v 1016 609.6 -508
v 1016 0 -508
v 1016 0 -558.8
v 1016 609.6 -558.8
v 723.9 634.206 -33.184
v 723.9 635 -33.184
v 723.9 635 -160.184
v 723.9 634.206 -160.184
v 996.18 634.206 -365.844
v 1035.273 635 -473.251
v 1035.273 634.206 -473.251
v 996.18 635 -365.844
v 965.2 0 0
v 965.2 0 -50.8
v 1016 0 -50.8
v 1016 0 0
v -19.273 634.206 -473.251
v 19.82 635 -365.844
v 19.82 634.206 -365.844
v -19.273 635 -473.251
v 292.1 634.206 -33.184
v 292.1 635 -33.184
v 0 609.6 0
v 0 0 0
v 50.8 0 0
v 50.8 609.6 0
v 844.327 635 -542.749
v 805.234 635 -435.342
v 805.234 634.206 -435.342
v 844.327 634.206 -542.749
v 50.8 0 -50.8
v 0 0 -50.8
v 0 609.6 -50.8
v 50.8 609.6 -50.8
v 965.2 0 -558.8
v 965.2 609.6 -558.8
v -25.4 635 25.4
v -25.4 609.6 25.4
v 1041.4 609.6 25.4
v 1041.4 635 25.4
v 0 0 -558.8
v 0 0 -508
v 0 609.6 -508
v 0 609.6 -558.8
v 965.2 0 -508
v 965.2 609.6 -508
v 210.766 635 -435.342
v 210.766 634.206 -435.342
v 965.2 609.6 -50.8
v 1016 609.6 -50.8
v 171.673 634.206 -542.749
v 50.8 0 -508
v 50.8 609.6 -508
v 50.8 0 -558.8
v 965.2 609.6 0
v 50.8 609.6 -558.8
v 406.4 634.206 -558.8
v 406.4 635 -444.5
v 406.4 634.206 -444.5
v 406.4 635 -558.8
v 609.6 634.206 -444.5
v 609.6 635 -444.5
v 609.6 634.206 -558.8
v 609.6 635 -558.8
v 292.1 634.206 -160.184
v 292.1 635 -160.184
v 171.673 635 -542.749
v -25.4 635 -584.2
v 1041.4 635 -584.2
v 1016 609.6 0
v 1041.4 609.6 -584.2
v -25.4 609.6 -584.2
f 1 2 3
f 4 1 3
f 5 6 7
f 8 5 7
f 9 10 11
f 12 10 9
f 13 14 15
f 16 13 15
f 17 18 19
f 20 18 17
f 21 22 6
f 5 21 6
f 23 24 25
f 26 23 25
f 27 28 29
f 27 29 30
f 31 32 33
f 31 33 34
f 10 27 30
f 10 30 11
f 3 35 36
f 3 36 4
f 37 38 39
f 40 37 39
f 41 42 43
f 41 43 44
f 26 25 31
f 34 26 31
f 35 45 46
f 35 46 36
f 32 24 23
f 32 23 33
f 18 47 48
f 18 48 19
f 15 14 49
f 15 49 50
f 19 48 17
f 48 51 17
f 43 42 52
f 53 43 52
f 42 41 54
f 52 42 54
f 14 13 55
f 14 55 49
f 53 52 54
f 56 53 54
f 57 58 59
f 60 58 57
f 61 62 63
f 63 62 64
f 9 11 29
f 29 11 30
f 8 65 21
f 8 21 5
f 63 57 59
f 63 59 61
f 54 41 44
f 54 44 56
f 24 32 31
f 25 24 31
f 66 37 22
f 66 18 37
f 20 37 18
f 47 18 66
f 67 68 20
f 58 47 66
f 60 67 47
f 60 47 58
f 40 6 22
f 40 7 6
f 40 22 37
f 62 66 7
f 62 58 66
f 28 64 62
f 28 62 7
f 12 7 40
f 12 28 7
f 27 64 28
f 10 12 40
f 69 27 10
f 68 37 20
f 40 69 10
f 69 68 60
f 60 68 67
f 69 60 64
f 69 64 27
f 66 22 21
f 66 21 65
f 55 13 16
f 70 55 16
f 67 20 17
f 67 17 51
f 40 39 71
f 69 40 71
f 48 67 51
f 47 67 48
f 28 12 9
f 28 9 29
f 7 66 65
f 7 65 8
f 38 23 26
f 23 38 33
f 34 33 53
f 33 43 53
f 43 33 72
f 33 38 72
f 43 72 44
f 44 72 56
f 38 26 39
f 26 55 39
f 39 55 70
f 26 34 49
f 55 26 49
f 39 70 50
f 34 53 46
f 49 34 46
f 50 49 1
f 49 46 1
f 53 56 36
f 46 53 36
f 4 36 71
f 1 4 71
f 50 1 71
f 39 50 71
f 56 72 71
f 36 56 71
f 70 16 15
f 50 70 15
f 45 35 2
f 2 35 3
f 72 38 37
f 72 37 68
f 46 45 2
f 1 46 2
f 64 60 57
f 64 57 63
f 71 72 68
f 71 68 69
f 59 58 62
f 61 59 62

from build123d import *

# Parameters (mm, degrees)
SKETCH1_W             = 50.8
SKETCH1_H             = 50.8
BOSS_EXTRUDE1_DEPTH   = 609.6
BOSS_EXTRUDE1_2_DEPTH = 609.6
BOSS_EXTRUDE1_3_DEPTH = 609.6
BOSS_EXTRUDE1_4_DEPTH = 609.6
SKETCH2_W             = 1066.8
SKETCH2_H             = 609.6
BOSS_EXTRUDE2_DEPTH   = 25.4
SKETCH3_W             = 203.2
SKETCH3_H             = 114.3
SKETCH3_W_2           = 431.8
SKETCH3_H_2           = 127
CUT_EXTRUDE1_DEPTH    = 0.79375


with BuildPart() as part:
    # Sketch1 → Boss-Extrude1 (new body)
    with BuildSketch(Plane(origin=(0, 0, 0), x_dir=(1, 0, 0), z_dir=(0, 1, 0))):
        with Locations((25.4, 25.4)):
            Rectangle(SKETCH1_W, SKETCH1_H)
    extrude(amount=BOSS_EXTRUDE1_DEPTH)



with BuildPart() as body_2:
    # Sketch1 → Boss-Extrude1 2 (new body)
    with BuildSketch(Plane(origin=(0, 0, 0), x_dir=(1, 0, 0), z_dir=(0, 1, 0))):
        with Locations((25.4, 533.4)):
            Rectangle(SKETCH1_W, SKETCH1_H)
    extrude(amount=BOSS_EXTRUDE1_2_DEPTH)


with BuildPart() as body_3:
    # Sketch1 → Boss-Extrude1 3 (new body)
    with BuildSketch(Plane(origin=(0, 0, 0), x_dir=(1, 0, 0), z_dir=(0, 1, 0))):
        with Locations((990.6, 533.4)):
            Rectangle(SKETCH1_W, SKETCH1_H)
    extrude(amount=BOSS_EXTRUDE1_3_DEPTH)


with BuildPart() as body_4:
    # Sketch1 → Boss-Extrude1 4 (new body)
    with BuildSketch(Plane(origin=(0, 0, 0), x_dir=(1, 0, 0), z_dir=(0, 1, 0))):
        with Locations((990.6, 25.4)):
            Rectangle(SKETCH1_W, SKETCH1_H)
    extrude(amount=BOSS_EXTRUDE1_4_DEPTH)


with BuildPart() as part_1:
    add(part.part)

    add(body_2.part)  # Boss-Extrude2 merges body 2

    add(body_3.part)  # Boss-Extrude2 merges body 3

    add(body_4.part)  # Boss-Extrude2 merges body 4
    # Sketch2 → Boss-Extrude2 (add)
    with BuildSketch(Plane(origin=(0, 609.6, 0), x_dir=(1, 0, 0), z_dir=(0, 1, 0))):
        with Locations((508, 279.4)):
            Rectangle(SKETCH2_W, SKETCH2_H)
    extrude(amount=BOSS_EXTRUDE2_DEPTH)

    # Sketch3 → Cut-Extrude1 (cut)
    with BuildSketch(Plane(origin=(0, 635, 0), x_dir=(1, 0, 0), z_dir=(0, 1, 0))):
        Polygon((210.765672654, 435.342380006), (19.82013211, 365.843886882), (-19.272770272, 473.250753438), (171.672770272, 542.749246562), align=None)
        with Locations((508, 501.65)):
            Rectangle(SKETCH3_W, SKETCH3_H)
        Polygon((844.327229728, 542.749246562), (1035.272770272, 473.250753438), (996.17986789, 365.843886882), (805.234327346, 435.342380006), align=None)
        with Locations((508, 96.68413443)):
            Rectangle(SKETCH3_W_2, SKETCH3_H_2)
    extrude(amount=-CUT_EXTRUDE1_DEPTH, mode=Mode.SUBTRACT)


solid = part_1.part
